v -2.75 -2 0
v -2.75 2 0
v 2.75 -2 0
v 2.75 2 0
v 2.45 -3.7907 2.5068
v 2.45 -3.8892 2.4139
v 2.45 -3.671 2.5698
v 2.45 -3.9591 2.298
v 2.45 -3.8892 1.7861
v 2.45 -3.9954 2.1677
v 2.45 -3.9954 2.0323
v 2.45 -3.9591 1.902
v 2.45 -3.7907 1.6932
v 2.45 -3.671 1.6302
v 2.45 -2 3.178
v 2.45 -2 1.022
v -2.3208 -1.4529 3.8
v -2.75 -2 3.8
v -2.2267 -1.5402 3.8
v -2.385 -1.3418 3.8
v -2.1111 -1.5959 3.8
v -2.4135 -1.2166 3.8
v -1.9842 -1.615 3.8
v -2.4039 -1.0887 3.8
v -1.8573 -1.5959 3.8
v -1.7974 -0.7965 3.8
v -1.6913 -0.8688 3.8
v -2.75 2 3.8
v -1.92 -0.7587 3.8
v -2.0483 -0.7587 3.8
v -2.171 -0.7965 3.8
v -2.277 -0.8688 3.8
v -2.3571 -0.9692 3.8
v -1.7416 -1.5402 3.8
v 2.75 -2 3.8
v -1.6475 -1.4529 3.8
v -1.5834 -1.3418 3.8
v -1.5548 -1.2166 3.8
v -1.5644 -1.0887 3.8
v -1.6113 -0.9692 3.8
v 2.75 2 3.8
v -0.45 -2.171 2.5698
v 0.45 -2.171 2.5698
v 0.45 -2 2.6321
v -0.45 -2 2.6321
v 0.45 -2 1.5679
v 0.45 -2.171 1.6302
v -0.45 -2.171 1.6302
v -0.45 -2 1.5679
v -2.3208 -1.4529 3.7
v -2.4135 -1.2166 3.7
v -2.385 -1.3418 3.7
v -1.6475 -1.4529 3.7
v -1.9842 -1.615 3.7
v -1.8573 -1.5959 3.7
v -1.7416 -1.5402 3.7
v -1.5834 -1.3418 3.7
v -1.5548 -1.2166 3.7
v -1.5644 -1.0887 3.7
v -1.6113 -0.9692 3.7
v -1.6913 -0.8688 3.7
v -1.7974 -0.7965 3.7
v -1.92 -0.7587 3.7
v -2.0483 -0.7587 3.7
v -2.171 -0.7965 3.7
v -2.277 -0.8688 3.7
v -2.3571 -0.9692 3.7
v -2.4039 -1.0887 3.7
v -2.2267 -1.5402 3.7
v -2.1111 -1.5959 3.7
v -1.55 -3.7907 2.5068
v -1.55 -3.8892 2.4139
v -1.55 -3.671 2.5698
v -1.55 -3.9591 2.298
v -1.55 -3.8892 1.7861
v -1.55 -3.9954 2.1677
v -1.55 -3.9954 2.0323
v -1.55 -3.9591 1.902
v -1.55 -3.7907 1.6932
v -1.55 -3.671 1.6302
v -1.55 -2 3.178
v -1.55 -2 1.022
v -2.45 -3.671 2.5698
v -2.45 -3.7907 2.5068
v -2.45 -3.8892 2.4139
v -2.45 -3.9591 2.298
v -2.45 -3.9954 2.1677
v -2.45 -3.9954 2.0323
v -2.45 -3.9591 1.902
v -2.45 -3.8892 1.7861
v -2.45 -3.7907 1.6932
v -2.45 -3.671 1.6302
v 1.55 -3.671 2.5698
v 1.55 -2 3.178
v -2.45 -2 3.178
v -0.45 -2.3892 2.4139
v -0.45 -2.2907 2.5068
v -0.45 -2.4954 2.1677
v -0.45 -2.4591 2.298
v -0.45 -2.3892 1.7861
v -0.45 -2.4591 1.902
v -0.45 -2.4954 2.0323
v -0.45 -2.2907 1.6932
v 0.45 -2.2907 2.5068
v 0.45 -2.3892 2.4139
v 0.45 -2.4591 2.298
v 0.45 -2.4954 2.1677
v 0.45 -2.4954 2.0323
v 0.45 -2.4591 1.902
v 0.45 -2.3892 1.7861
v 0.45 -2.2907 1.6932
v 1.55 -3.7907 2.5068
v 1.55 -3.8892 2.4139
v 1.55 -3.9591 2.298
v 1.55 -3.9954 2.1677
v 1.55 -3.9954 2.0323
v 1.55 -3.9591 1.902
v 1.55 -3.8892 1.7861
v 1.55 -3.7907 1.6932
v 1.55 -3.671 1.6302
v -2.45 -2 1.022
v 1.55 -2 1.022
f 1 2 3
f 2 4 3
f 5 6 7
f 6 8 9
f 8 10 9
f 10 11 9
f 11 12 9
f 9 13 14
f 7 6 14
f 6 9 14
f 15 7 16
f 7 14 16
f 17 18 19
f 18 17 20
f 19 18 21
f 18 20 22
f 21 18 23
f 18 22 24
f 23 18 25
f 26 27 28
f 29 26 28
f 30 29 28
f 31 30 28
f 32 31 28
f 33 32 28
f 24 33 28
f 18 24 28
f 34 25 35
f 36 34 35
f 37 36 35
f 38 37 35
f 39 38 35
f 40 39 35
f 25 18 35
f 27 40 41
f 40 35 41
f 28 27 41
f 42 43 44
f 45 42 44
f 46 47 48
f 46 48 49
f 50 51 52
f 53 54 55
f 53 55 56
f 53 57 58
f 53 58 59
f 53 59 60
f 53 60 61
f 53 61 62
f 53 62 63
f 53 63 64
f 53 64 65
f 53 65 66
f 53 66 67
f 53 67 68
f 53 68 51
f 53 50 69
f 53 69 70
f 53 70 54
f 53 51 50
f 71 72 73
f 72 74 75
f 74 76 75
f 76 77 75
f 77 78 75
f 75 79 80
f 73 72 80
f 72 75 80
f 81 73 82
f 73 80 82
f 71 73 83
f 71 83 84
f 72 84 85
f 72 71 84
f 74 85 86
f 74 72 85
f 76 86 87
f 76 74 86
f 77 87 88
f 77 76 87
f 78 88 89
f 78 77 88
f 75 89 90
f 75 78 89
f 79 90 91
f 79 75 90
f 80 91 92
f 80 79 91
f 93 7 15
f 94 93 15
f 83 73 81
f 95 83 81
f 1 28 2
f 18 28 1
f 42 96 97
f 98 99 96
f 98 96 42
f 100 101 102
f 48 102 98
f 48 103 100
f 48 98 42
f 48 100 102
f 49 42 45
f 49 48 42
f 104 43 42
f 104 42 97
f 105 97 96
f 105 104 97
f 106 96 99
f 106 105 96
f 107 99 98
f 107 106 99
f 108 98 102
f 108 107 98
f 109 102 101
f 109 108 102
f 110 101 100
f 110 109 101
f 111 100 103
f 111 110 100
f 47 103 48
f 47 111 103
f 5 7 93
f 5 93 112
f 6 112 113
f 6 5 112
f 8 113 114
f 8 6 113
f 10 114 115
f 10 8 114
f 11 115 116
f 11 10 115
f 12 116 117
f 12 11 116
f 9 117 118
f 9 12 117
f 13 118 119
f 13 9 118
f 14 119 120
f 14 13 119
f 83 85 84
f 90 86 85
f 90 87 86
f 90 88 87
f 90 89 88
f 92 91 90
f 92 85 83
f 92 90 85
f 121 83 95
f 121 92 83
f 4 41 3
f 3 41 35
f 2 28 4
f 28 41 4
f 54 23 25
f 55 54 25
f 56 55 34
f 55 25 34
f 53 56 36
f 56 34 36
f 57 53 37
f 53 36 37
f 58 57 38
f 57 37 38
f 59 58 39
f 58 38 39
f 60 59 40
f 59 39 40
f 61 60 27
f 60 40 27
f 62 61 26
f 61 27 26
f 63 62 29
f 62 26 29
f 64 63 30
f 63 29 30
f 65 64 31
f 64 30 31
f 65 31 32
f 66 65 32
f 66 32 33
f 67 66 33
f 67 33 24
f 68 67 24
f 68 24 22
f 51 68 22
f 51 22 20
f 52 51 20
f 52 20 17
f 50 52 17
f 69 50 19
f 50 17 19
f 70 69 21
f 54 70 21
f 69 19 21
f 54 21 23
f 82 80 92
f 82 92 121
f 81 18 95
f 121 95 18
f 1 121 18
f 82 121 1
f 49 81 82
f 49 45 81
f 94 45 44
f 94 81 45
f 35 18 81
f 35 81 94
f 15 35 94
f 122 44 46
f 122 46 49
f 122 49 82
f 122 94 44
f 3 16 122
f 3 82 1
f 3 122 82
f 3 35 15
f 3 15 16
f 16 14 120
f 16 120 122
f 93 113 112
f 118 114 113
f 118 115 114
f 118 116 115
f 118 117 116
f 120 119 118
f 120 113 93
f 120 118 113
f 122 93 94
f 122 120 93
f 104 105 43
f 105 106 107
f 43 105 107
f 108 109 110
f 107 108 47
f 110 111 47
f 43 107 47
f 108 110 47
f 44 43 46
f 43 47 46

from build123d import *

# Parameters (mm, degrees)
PAD_DEPTH       = 2.75
SKETCH001_W     = 1.1
SKETCH001_H     = 5
POCKET_DEPTH    = 5
POCKET001_DEPTH = 1
SKETCH003_R     = 0.430574
POCKET002_DEPTH = 0.1


with BuildPart() as part:
    # Sketch → Pad (new body, symmetric)
    with BuildSketch(Plane.YZ):
        with BuildLine():
            Line((-2, 3.8), (2, 3.8))
            Line((2, 3.8), (2, 0))
            Line((2, 0), (-2, 0))
            Line((-2, 1.021956), (-2, 0))
            Line((-3.67101, 1.630154), (-2, 1.021956))
            ThreePointArc((-3.67101, 2.569846), (-4, 2.1), (-3.67101, 1.630154))
            Line((-3.67101, 2.569846), (-2, 3.178044))
            Line((-2, 3.8), (-2, 3.178044))
        make_face()
    extrude(amount=PAD_DEPTH, both=True)

    # Sketch001 → Pocket (cut)
    with BuildSketch(Plane.XY):
        with Locations((-3, -4.5)):
            Rectangle(SKETCH001_W, SKETCH001_H)
        with Locations((3, -4.5)):
            Rectangle(SKETCH001_W, SKETCH001_H)
        with Locations((-1, -4.5)):
            Rectangle(SKETCH001_W, SKETCH001_H)
        with Locations((1, -4.5)):
            Rectangle(SKETCH001_W, SKETCH001_H)
    extrude(amount=POCKET_DEPTH, mode=Mode.SUBTRACT)

    # Sketch002 → Pocket001 (cut, symmetric)
    with BuildSketch(Plane.YZ):
        with BuildLine():
            Line((-2, 3.803843), (-2, 2.632089))
            Line((-2.17101, 2.569846), (-2, 2.632089))
            ThreePointArc((-2.17101, 2.569846), (-2.5, 2.1), (-2.17101, 1.630154))
            Line((-2.17101, 1.630154), (-2, 1.567911))
            Line((-2, 1.567911), (-2, 0))
            Line((-2, 0), (-4.600504, 0))
            Line((-4.600504, 0), (-4.600504, 3.803843))
            Line((-4.600504, 3.803843), (-2, 3.803843))
        make_face()
    extrude(amount=POCKET001_DEPTH, both=True, mode=Mode.SUBTRACT)

    # Sketch003 (on Face5 of Pocket001) → Pocket002 (cut)
    with BuildSketch(Plane(origin=(0, 0, 3.8), x_dir=(0, -1, 0), z_dir=(0, 0, 1))):
        with Locations((1.184462, -1.98417)):
            Circle(SKETCH003_R)
    extrude(amount=-POCKET002_DEPTH, mode=Mode.SUBTRACT)


solid = part.part
